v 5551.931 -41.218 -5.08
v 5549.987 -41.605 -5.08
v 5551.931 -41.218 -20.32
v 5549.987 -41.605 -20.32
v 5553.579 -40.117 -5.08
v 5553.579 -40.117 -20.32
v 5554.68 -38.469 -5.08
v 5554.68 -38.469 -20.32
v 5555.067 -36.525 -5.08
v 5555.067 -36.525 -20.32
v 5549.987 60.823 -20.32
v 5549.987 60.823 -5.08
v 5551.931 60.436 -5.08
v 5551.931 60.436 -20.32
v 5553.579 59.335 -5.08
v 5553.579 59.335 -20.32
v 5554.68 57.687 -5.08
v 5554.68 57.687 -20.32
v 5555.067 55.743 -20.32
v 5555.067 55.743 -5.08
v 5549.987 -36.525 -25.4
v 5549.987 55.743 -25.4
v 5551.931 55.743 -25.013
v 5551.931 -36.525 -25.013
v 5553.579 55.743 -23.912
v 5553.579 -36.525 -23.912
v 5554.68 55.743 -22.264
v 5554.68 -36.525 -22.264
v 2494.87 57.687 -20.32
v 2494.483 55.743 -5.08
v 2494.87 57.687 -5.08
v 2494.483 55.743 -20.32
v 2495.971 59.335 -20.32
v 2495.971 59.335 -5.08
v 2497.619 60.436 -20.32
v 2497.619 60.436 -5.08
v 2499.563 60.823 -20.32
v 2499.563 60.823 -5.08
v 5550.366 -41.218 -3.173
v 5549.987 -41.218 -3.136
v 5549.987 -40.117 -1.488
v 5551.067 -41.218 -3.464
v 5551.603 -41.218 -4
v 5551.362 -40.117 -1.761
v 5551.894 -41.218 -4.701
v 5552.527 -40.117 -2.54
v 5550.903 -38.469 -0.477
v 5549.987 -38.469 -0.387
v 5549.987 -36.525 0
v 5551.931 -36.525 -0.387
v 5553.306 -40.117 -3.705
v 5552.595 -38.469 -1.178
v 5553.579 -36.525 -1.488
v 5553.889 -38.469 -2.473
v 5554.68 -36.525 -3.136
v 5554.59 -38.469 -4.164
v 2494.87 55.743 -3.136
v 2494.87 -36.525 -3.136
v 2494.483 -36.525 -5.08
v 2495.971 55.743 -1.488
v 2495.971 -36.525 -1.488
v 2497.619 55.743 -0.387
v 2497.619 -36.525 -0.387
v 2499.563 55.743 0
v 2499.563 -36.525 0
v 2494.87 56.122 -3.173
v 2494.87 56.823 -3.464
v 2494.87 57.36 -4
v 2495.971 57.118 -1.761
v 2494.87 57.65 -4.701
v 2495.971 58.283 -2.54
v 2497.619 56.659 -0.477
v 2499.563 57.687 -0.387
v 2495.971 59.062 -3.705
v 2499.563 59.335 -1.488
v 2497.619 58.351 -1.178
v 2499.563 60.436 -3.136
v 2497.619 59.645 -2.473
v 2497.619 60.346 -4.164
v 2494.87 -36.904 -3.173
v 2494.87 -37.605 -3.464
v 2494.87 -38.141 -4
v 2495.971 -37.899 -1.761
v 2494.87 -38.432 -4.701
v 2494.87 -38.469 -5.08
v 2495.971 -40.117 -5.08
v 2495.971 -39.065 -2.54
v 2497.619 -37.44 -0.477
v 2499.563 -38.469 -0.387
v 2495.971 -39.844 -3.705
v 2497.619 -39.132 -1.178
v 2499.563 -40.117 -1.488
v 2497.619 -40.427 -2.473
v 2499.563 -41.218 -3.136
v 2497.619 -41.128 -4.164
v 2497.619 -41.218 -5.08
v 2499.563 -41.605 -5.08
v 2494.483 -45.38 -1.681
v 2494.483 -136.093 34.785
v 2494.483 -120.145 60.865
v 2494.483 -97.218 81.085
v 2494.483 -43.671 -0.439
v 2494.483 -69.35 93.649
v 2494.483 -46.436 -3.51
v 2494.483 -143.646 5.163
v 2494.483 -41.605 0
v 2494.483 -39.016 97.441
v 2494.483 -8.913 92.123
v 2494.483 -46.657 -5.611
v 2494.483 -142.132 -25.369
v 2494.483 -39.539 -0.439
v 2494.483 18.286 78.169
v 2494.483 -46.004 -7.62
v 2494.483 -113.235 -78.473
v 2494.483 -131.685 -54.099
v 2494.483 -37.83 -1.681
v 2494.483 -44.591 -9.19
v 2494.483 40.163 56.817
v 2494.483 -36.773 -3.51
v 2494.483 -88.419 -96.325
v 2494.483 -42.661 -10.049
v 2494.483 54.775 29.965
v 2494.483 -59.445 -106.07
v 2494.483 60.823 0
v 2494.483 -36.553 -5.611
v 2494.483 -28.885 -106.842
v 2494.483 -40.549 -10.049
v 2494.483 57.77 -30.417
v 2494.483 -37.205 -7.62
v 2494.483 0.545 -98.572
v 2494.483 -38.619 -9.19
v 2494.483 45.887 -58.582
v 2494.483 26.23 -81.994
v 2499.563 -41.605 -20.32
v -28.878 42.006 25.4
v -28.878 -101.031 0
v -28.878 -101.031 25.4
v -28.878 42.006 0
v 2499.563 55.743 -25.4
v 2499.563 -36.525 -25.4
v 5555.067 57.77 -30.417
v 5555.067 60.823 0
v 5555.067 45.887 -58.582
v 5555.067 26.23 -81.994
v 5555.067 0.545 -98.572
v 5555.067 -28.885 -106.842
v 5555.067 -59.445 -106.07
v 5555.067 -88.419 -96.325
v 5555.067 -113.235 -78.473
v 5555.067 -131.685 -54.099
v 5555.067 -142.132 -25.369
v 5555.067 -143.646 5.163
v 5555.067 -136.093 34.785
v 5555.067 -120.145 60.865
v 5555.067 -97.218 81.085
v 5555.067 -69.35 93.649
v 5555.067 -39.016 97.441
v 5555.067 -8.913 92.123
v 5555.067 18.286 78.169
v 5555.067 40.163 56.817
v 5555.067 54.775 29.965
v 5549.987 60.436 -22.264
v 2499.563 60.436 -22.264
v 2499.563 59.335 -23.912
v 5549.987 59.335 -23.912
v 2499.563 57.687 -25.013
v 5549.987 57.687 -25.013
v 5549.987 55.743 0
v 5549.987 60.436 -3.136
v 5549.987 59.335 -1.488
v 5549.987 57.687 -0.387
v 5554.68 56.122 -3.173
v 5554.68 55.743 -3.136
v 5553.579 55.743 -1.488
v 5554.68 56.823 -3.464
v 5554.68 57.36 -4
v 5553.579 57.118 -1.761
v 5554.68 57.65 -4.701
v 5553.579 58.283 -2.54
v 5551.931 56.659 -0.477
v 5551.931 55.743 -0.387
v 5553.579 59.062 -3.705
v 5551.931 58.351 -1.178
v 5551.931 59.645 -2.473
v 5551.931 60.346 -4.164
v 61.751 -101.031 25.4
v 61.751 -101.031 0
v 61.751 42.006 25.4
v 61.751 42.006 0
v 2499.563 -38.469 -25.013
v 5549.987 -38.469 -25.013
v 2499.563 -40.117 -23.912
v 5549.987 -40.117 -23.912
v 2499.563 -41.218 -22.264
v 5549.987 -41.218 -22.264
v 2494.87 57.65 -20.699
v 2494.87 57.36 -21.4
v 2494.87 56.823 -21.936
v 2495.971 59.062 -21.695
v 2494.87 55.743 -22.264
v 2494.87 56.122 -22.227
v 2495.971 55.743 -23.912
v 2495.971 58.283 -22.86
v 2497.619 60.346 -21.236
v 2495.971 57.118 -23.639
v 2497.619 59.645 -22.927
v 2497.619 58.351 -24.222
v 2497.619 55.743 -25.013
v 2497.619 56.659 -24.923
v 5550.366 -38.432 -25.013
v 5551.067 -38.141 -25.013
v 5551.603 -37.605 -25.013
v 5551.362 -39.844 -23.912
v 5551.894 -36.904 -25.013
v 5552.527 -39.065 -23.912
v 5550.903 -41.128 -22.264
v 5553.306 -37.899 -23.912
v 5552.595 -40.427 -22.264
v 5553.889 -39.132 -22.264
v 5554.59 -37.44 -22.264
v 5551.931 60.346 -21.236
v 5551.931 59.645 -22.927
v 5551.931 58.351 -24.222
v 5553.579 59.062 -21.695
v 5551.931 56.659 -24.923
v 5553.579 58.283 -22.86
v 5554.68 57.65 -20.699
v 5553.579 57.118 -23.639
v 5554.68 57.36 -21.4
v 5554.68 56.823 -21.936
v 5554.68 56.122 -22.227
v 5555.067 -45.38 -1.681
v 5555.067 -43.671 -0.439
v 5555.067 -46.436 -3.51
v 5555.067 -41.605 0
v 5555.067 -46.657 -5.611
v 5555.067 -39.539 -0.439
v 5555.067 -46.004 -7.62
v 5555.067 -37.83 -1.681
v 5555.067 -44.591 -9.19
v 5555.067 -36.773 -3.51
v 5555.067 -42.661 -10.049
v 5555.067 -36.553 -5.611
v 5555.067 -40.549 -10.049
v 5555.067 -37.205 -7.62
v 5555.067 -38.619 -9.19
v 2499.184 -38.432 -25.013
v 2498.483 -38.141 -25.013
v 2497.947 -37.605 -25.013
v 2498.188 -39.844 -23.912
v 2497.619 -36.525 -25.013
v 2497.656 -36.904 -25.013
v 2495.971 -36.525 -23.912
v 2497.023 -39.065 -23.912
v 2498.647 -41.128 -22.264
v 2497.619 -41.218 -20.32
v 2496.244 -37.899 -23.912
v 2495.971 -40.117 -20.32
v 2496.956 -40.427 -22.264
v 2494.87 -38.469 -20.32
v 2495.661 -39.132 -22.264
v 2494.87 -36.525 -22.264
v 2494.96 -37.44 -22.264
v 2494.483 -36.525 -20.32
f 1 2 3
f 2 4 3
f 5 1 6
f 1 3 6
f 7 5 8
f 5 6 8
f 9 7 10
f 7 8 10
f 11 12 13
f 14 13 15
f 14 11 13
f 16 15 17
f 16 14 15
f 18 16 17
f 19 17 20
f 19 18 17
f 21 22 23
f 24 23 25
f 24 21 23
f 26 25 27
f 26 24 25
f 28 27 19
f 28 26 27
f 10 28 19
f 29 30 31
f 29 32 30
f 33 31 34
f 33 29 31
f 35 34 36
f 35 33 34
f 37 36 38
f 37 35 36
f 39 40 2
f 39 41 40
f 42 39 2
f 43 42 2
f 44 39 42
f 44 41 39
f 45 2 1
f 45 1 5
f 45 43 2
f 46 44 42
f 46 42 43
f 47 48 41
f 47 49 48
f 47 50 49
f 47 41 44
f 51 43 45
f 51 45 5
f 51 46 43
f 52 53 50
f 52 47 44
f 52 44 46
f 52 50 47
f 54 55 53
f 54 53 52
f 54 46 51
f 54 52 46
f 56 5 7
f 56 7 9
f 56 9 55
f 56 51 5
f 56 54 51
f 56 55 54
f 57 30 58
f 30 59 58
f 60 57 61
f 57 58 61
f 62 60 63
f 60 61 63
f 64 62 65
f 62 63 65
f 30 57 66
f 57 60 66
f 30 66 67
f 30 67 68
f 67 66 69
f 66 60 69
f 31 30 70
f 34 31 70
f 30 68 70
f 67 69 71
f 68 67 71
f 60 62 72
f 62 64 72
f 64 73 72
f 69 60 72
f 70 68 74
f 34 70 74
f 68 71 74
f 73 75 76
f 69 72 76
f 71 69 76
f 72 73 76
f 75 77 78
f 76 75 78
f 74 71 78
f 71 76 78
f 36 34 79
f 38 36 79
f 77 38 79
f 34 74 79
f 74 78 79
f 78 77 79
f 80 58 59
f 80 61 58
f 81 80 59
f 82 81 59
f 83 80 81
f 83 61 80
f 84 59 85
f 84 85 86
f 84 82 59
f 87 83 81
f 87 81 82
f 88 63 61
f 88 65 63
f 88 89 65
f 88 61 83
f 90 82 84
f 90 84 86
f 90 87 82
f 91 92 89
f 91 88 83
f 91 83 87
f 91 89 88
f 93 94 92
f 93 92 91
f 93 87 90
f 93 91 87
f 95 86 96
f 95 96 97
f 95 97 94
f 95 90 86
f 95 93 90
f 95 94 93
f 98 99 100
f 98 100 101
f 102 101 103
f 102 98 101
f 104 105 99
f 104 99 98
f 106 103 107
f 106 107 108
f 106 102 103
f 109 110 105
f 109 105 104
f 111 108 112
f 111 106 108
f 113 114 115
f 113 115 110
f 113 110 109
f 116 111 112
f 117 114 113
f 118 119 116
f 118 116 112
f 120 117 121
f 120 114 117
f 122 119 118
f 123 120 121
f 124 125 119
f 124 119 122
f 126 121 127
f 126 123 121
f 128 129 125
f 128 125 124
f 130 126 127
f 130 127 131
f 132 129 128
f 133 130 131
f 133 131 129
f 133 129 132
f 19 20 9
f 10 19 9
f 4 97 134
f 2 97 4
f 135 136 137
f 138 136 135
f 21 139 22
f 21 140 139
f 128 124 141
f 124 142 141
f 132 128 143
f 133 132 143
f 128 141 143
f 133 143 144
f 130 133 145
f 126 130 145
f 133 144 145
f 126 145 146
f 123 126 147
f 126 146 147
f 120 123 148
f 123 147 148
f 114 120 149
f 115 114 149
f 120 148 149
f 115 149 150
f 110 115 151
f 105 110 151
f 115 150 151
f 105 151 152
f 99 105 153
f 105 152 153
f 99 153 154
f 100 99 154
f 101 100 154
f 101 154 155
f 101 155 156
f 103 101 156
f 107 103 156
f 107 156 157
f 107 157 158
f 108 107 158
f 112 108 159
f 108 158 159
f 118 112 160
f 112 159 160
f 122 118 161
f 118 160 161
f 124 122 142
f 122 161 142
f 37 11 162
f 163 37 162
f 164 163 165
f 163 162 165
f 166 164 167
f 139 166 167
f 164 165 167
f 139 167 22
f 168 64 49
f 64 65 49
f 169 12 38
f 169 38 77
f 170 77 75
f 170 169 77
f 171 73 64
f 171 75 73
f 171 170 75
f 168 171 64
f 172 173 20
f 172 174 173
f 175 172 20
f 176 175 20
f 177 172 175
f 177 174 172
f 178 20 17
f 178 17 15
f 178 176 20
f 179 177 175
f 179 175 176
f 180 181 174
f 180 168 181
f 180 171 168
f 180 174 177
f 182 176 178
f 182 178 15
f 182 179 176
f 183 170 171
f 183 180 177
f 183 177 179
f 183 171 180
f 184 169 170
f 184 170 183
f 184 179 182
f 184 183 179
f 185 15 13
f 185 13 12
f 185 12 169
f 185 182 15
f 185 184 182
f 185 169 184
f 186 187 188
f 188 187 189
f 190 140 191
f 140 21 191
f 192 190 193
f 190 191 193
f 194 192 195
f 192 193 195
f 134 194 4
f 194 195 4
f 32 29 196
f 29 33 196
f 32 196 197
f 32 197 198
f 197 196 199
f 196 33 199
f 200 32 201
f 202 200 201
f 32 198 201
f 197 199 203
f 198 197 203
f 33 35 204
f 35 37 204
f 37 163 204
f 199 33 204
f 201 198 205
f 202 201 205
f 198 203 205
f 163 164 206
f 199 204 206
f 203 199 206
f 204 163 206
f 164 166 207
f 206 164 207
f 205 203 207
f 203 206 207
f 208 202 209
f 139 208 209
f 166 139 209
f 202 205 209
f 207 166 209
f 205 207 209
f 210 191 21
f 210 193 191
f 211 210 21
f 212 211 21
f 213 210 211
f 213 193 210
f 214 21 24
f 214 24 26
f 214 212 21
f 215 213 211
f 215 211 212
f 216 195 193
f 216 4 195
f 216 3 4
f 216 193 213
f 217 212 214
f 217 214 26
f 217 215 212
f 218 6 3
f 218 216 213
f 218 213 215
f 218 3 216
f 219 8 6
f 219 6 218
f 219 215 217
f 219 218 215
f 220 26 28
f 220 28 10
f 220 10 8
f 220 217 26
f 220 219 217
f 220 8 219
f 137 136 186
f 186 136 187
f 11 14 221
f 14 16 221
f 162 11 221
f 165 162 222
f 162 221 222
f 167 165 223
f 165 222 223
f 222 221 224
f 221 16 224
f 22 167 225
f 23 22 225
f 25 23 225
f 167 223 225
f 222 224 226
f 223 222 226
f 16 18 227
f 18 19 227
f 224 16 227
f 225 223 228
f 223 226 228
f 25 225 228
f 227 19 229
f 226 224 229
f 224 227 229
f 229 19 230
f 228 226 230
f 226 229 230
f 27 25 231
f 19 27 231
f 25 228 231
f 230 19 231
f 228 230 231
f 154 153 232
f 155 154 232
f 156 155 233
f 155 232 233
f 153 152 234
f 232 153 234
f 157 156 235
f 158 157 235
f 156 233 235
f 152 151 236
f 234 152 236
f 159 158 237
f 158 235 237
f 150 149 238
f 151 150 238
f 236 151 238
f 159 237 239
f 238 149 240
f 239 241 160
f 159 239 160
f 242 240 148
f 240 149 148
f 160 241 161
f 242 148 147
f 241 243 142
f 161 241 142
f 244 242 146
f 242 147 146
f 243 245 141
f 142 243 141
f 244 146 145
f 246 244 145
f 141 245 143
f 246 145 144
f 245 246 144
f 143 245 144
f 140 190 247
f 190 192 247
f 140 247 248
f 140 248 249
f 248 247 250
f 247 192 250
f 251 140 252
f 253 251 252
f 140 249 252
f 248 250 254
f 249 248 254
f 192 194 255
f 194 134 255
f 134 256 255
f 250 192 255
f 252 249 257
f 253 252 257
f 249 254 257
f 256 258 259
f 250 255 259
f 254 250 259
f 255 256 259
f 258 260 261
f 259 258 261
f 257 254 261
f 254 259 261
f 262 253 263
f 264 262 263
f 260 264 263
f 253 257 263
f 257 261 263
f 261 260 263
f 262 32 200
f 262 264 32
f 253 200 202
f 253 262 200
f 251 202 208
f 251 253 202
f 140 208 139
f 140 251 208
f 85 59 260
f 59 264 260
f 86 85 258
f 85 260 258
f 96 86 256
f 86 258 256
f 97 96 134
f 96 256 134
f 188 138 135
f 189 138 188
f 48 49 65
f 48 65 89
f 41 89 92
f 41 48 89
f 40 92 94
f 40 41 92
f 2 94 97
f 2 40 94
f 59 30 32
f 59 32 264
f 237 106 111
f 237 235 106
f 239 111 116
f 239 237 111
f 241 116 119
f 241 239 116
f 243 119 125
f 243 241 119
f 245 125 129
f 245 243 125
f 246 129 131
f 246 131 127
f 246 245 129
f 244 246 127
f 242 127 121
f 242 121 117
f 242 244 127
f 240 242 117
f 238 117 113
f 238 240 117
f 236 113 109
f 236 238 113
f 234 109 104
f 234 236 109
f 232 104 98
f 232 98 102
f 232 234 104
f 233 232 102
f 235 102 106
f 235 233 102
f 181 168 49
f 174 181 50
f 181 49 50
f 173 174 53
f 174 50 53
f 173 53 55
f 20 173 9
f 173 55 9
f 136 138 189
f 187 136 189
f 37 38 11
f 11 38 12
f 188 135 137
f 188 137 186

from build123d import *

# Parameters (mm, degrees)
F0_W     = 90.6293261796
F0_H     = 143.0367194116
F1_DEPTH = 25.4
F2_W     = 3060.5840682983
F2_H     = 102.4279408157
F3_DEPTH = 25.4
F4_R     = 5.08
F5_R     = 5.08


with BuildPart() as f1:
    # F0 (on Top) → F1 (new body)
    with BuildSketch(Plane.XY):
        with Locations((16.4367323741, -29.5125786215)):
            Rectangle(F0_W, F0_H)
    extrude(amount=F1_DEPTH)


with BuildPart() as f3:
    # F2 (on face) → F3 (new body)
    with BuildSketch(Plane(origin=(0, 0, 0), x_dir=(1, 0, 0), z_dir=(0, 0, -1))):
        with Locations((4024.7750282288, -9.6091311425)):
            Rectangle(F2_W, F2_H)
    extrude(amount=F3_DEPTH)

    # F4
    f4_edges = [f3.edges().sort_by_distance(p)[0] for p in [
        (4024.775028, 60.823102, -25.4),
    ]]
    fillet(f4_edges, radius=F4_R)

    # F5
    f5_edges = [f3.edges().sort_by_distance(p)[0] for p in [
        (4024.775028, 60.823102, 0),
        (5555.067062, 9.609131, 0),
        (4024.775028, -41.604839, 0),
        (2494.482994, 9.609131, 0),
        (5555.067062, -41.604839, -12.7),
        (2494.482994, -41.604839, -12.7),
        (4024.775028, -41.604839, -25.4),
        (2494.482994, 59.335204, -23.912102),
        (4024.775028, 60.823102, -20.32),
        (4024.775028, 55.743102, -25.4),
        (5555.067062, 59.335204, -23.912102),
        (2494.482994, 60.823102, -10.16),
        (5555.067062, 60.823102, -10.16),
        (5555.067062, 7.069131, -25.4),
        (2494.482994, 7.069131, -25.4),
    ]]
    fillet(f5_edges, radius=F5_R)


with BuildPart() as f6:
    # F2 (on face) → F6 (revolve)
    with BuildSketch(Plane(origin=(0, 0, 0), x_dir=(1, 0, 0), z_dir=(0, 0, -1))):
        with Locations((4024.7750282288, -9.6091311425)):
            Rectangle(F2_W, F2_H)
    revolve(axis=Axis((4024.7750282288, -41.6048392653, -5.08), (-1, 0, 0)))


solid = Compound([f1.part, f3.part, f6.part])
